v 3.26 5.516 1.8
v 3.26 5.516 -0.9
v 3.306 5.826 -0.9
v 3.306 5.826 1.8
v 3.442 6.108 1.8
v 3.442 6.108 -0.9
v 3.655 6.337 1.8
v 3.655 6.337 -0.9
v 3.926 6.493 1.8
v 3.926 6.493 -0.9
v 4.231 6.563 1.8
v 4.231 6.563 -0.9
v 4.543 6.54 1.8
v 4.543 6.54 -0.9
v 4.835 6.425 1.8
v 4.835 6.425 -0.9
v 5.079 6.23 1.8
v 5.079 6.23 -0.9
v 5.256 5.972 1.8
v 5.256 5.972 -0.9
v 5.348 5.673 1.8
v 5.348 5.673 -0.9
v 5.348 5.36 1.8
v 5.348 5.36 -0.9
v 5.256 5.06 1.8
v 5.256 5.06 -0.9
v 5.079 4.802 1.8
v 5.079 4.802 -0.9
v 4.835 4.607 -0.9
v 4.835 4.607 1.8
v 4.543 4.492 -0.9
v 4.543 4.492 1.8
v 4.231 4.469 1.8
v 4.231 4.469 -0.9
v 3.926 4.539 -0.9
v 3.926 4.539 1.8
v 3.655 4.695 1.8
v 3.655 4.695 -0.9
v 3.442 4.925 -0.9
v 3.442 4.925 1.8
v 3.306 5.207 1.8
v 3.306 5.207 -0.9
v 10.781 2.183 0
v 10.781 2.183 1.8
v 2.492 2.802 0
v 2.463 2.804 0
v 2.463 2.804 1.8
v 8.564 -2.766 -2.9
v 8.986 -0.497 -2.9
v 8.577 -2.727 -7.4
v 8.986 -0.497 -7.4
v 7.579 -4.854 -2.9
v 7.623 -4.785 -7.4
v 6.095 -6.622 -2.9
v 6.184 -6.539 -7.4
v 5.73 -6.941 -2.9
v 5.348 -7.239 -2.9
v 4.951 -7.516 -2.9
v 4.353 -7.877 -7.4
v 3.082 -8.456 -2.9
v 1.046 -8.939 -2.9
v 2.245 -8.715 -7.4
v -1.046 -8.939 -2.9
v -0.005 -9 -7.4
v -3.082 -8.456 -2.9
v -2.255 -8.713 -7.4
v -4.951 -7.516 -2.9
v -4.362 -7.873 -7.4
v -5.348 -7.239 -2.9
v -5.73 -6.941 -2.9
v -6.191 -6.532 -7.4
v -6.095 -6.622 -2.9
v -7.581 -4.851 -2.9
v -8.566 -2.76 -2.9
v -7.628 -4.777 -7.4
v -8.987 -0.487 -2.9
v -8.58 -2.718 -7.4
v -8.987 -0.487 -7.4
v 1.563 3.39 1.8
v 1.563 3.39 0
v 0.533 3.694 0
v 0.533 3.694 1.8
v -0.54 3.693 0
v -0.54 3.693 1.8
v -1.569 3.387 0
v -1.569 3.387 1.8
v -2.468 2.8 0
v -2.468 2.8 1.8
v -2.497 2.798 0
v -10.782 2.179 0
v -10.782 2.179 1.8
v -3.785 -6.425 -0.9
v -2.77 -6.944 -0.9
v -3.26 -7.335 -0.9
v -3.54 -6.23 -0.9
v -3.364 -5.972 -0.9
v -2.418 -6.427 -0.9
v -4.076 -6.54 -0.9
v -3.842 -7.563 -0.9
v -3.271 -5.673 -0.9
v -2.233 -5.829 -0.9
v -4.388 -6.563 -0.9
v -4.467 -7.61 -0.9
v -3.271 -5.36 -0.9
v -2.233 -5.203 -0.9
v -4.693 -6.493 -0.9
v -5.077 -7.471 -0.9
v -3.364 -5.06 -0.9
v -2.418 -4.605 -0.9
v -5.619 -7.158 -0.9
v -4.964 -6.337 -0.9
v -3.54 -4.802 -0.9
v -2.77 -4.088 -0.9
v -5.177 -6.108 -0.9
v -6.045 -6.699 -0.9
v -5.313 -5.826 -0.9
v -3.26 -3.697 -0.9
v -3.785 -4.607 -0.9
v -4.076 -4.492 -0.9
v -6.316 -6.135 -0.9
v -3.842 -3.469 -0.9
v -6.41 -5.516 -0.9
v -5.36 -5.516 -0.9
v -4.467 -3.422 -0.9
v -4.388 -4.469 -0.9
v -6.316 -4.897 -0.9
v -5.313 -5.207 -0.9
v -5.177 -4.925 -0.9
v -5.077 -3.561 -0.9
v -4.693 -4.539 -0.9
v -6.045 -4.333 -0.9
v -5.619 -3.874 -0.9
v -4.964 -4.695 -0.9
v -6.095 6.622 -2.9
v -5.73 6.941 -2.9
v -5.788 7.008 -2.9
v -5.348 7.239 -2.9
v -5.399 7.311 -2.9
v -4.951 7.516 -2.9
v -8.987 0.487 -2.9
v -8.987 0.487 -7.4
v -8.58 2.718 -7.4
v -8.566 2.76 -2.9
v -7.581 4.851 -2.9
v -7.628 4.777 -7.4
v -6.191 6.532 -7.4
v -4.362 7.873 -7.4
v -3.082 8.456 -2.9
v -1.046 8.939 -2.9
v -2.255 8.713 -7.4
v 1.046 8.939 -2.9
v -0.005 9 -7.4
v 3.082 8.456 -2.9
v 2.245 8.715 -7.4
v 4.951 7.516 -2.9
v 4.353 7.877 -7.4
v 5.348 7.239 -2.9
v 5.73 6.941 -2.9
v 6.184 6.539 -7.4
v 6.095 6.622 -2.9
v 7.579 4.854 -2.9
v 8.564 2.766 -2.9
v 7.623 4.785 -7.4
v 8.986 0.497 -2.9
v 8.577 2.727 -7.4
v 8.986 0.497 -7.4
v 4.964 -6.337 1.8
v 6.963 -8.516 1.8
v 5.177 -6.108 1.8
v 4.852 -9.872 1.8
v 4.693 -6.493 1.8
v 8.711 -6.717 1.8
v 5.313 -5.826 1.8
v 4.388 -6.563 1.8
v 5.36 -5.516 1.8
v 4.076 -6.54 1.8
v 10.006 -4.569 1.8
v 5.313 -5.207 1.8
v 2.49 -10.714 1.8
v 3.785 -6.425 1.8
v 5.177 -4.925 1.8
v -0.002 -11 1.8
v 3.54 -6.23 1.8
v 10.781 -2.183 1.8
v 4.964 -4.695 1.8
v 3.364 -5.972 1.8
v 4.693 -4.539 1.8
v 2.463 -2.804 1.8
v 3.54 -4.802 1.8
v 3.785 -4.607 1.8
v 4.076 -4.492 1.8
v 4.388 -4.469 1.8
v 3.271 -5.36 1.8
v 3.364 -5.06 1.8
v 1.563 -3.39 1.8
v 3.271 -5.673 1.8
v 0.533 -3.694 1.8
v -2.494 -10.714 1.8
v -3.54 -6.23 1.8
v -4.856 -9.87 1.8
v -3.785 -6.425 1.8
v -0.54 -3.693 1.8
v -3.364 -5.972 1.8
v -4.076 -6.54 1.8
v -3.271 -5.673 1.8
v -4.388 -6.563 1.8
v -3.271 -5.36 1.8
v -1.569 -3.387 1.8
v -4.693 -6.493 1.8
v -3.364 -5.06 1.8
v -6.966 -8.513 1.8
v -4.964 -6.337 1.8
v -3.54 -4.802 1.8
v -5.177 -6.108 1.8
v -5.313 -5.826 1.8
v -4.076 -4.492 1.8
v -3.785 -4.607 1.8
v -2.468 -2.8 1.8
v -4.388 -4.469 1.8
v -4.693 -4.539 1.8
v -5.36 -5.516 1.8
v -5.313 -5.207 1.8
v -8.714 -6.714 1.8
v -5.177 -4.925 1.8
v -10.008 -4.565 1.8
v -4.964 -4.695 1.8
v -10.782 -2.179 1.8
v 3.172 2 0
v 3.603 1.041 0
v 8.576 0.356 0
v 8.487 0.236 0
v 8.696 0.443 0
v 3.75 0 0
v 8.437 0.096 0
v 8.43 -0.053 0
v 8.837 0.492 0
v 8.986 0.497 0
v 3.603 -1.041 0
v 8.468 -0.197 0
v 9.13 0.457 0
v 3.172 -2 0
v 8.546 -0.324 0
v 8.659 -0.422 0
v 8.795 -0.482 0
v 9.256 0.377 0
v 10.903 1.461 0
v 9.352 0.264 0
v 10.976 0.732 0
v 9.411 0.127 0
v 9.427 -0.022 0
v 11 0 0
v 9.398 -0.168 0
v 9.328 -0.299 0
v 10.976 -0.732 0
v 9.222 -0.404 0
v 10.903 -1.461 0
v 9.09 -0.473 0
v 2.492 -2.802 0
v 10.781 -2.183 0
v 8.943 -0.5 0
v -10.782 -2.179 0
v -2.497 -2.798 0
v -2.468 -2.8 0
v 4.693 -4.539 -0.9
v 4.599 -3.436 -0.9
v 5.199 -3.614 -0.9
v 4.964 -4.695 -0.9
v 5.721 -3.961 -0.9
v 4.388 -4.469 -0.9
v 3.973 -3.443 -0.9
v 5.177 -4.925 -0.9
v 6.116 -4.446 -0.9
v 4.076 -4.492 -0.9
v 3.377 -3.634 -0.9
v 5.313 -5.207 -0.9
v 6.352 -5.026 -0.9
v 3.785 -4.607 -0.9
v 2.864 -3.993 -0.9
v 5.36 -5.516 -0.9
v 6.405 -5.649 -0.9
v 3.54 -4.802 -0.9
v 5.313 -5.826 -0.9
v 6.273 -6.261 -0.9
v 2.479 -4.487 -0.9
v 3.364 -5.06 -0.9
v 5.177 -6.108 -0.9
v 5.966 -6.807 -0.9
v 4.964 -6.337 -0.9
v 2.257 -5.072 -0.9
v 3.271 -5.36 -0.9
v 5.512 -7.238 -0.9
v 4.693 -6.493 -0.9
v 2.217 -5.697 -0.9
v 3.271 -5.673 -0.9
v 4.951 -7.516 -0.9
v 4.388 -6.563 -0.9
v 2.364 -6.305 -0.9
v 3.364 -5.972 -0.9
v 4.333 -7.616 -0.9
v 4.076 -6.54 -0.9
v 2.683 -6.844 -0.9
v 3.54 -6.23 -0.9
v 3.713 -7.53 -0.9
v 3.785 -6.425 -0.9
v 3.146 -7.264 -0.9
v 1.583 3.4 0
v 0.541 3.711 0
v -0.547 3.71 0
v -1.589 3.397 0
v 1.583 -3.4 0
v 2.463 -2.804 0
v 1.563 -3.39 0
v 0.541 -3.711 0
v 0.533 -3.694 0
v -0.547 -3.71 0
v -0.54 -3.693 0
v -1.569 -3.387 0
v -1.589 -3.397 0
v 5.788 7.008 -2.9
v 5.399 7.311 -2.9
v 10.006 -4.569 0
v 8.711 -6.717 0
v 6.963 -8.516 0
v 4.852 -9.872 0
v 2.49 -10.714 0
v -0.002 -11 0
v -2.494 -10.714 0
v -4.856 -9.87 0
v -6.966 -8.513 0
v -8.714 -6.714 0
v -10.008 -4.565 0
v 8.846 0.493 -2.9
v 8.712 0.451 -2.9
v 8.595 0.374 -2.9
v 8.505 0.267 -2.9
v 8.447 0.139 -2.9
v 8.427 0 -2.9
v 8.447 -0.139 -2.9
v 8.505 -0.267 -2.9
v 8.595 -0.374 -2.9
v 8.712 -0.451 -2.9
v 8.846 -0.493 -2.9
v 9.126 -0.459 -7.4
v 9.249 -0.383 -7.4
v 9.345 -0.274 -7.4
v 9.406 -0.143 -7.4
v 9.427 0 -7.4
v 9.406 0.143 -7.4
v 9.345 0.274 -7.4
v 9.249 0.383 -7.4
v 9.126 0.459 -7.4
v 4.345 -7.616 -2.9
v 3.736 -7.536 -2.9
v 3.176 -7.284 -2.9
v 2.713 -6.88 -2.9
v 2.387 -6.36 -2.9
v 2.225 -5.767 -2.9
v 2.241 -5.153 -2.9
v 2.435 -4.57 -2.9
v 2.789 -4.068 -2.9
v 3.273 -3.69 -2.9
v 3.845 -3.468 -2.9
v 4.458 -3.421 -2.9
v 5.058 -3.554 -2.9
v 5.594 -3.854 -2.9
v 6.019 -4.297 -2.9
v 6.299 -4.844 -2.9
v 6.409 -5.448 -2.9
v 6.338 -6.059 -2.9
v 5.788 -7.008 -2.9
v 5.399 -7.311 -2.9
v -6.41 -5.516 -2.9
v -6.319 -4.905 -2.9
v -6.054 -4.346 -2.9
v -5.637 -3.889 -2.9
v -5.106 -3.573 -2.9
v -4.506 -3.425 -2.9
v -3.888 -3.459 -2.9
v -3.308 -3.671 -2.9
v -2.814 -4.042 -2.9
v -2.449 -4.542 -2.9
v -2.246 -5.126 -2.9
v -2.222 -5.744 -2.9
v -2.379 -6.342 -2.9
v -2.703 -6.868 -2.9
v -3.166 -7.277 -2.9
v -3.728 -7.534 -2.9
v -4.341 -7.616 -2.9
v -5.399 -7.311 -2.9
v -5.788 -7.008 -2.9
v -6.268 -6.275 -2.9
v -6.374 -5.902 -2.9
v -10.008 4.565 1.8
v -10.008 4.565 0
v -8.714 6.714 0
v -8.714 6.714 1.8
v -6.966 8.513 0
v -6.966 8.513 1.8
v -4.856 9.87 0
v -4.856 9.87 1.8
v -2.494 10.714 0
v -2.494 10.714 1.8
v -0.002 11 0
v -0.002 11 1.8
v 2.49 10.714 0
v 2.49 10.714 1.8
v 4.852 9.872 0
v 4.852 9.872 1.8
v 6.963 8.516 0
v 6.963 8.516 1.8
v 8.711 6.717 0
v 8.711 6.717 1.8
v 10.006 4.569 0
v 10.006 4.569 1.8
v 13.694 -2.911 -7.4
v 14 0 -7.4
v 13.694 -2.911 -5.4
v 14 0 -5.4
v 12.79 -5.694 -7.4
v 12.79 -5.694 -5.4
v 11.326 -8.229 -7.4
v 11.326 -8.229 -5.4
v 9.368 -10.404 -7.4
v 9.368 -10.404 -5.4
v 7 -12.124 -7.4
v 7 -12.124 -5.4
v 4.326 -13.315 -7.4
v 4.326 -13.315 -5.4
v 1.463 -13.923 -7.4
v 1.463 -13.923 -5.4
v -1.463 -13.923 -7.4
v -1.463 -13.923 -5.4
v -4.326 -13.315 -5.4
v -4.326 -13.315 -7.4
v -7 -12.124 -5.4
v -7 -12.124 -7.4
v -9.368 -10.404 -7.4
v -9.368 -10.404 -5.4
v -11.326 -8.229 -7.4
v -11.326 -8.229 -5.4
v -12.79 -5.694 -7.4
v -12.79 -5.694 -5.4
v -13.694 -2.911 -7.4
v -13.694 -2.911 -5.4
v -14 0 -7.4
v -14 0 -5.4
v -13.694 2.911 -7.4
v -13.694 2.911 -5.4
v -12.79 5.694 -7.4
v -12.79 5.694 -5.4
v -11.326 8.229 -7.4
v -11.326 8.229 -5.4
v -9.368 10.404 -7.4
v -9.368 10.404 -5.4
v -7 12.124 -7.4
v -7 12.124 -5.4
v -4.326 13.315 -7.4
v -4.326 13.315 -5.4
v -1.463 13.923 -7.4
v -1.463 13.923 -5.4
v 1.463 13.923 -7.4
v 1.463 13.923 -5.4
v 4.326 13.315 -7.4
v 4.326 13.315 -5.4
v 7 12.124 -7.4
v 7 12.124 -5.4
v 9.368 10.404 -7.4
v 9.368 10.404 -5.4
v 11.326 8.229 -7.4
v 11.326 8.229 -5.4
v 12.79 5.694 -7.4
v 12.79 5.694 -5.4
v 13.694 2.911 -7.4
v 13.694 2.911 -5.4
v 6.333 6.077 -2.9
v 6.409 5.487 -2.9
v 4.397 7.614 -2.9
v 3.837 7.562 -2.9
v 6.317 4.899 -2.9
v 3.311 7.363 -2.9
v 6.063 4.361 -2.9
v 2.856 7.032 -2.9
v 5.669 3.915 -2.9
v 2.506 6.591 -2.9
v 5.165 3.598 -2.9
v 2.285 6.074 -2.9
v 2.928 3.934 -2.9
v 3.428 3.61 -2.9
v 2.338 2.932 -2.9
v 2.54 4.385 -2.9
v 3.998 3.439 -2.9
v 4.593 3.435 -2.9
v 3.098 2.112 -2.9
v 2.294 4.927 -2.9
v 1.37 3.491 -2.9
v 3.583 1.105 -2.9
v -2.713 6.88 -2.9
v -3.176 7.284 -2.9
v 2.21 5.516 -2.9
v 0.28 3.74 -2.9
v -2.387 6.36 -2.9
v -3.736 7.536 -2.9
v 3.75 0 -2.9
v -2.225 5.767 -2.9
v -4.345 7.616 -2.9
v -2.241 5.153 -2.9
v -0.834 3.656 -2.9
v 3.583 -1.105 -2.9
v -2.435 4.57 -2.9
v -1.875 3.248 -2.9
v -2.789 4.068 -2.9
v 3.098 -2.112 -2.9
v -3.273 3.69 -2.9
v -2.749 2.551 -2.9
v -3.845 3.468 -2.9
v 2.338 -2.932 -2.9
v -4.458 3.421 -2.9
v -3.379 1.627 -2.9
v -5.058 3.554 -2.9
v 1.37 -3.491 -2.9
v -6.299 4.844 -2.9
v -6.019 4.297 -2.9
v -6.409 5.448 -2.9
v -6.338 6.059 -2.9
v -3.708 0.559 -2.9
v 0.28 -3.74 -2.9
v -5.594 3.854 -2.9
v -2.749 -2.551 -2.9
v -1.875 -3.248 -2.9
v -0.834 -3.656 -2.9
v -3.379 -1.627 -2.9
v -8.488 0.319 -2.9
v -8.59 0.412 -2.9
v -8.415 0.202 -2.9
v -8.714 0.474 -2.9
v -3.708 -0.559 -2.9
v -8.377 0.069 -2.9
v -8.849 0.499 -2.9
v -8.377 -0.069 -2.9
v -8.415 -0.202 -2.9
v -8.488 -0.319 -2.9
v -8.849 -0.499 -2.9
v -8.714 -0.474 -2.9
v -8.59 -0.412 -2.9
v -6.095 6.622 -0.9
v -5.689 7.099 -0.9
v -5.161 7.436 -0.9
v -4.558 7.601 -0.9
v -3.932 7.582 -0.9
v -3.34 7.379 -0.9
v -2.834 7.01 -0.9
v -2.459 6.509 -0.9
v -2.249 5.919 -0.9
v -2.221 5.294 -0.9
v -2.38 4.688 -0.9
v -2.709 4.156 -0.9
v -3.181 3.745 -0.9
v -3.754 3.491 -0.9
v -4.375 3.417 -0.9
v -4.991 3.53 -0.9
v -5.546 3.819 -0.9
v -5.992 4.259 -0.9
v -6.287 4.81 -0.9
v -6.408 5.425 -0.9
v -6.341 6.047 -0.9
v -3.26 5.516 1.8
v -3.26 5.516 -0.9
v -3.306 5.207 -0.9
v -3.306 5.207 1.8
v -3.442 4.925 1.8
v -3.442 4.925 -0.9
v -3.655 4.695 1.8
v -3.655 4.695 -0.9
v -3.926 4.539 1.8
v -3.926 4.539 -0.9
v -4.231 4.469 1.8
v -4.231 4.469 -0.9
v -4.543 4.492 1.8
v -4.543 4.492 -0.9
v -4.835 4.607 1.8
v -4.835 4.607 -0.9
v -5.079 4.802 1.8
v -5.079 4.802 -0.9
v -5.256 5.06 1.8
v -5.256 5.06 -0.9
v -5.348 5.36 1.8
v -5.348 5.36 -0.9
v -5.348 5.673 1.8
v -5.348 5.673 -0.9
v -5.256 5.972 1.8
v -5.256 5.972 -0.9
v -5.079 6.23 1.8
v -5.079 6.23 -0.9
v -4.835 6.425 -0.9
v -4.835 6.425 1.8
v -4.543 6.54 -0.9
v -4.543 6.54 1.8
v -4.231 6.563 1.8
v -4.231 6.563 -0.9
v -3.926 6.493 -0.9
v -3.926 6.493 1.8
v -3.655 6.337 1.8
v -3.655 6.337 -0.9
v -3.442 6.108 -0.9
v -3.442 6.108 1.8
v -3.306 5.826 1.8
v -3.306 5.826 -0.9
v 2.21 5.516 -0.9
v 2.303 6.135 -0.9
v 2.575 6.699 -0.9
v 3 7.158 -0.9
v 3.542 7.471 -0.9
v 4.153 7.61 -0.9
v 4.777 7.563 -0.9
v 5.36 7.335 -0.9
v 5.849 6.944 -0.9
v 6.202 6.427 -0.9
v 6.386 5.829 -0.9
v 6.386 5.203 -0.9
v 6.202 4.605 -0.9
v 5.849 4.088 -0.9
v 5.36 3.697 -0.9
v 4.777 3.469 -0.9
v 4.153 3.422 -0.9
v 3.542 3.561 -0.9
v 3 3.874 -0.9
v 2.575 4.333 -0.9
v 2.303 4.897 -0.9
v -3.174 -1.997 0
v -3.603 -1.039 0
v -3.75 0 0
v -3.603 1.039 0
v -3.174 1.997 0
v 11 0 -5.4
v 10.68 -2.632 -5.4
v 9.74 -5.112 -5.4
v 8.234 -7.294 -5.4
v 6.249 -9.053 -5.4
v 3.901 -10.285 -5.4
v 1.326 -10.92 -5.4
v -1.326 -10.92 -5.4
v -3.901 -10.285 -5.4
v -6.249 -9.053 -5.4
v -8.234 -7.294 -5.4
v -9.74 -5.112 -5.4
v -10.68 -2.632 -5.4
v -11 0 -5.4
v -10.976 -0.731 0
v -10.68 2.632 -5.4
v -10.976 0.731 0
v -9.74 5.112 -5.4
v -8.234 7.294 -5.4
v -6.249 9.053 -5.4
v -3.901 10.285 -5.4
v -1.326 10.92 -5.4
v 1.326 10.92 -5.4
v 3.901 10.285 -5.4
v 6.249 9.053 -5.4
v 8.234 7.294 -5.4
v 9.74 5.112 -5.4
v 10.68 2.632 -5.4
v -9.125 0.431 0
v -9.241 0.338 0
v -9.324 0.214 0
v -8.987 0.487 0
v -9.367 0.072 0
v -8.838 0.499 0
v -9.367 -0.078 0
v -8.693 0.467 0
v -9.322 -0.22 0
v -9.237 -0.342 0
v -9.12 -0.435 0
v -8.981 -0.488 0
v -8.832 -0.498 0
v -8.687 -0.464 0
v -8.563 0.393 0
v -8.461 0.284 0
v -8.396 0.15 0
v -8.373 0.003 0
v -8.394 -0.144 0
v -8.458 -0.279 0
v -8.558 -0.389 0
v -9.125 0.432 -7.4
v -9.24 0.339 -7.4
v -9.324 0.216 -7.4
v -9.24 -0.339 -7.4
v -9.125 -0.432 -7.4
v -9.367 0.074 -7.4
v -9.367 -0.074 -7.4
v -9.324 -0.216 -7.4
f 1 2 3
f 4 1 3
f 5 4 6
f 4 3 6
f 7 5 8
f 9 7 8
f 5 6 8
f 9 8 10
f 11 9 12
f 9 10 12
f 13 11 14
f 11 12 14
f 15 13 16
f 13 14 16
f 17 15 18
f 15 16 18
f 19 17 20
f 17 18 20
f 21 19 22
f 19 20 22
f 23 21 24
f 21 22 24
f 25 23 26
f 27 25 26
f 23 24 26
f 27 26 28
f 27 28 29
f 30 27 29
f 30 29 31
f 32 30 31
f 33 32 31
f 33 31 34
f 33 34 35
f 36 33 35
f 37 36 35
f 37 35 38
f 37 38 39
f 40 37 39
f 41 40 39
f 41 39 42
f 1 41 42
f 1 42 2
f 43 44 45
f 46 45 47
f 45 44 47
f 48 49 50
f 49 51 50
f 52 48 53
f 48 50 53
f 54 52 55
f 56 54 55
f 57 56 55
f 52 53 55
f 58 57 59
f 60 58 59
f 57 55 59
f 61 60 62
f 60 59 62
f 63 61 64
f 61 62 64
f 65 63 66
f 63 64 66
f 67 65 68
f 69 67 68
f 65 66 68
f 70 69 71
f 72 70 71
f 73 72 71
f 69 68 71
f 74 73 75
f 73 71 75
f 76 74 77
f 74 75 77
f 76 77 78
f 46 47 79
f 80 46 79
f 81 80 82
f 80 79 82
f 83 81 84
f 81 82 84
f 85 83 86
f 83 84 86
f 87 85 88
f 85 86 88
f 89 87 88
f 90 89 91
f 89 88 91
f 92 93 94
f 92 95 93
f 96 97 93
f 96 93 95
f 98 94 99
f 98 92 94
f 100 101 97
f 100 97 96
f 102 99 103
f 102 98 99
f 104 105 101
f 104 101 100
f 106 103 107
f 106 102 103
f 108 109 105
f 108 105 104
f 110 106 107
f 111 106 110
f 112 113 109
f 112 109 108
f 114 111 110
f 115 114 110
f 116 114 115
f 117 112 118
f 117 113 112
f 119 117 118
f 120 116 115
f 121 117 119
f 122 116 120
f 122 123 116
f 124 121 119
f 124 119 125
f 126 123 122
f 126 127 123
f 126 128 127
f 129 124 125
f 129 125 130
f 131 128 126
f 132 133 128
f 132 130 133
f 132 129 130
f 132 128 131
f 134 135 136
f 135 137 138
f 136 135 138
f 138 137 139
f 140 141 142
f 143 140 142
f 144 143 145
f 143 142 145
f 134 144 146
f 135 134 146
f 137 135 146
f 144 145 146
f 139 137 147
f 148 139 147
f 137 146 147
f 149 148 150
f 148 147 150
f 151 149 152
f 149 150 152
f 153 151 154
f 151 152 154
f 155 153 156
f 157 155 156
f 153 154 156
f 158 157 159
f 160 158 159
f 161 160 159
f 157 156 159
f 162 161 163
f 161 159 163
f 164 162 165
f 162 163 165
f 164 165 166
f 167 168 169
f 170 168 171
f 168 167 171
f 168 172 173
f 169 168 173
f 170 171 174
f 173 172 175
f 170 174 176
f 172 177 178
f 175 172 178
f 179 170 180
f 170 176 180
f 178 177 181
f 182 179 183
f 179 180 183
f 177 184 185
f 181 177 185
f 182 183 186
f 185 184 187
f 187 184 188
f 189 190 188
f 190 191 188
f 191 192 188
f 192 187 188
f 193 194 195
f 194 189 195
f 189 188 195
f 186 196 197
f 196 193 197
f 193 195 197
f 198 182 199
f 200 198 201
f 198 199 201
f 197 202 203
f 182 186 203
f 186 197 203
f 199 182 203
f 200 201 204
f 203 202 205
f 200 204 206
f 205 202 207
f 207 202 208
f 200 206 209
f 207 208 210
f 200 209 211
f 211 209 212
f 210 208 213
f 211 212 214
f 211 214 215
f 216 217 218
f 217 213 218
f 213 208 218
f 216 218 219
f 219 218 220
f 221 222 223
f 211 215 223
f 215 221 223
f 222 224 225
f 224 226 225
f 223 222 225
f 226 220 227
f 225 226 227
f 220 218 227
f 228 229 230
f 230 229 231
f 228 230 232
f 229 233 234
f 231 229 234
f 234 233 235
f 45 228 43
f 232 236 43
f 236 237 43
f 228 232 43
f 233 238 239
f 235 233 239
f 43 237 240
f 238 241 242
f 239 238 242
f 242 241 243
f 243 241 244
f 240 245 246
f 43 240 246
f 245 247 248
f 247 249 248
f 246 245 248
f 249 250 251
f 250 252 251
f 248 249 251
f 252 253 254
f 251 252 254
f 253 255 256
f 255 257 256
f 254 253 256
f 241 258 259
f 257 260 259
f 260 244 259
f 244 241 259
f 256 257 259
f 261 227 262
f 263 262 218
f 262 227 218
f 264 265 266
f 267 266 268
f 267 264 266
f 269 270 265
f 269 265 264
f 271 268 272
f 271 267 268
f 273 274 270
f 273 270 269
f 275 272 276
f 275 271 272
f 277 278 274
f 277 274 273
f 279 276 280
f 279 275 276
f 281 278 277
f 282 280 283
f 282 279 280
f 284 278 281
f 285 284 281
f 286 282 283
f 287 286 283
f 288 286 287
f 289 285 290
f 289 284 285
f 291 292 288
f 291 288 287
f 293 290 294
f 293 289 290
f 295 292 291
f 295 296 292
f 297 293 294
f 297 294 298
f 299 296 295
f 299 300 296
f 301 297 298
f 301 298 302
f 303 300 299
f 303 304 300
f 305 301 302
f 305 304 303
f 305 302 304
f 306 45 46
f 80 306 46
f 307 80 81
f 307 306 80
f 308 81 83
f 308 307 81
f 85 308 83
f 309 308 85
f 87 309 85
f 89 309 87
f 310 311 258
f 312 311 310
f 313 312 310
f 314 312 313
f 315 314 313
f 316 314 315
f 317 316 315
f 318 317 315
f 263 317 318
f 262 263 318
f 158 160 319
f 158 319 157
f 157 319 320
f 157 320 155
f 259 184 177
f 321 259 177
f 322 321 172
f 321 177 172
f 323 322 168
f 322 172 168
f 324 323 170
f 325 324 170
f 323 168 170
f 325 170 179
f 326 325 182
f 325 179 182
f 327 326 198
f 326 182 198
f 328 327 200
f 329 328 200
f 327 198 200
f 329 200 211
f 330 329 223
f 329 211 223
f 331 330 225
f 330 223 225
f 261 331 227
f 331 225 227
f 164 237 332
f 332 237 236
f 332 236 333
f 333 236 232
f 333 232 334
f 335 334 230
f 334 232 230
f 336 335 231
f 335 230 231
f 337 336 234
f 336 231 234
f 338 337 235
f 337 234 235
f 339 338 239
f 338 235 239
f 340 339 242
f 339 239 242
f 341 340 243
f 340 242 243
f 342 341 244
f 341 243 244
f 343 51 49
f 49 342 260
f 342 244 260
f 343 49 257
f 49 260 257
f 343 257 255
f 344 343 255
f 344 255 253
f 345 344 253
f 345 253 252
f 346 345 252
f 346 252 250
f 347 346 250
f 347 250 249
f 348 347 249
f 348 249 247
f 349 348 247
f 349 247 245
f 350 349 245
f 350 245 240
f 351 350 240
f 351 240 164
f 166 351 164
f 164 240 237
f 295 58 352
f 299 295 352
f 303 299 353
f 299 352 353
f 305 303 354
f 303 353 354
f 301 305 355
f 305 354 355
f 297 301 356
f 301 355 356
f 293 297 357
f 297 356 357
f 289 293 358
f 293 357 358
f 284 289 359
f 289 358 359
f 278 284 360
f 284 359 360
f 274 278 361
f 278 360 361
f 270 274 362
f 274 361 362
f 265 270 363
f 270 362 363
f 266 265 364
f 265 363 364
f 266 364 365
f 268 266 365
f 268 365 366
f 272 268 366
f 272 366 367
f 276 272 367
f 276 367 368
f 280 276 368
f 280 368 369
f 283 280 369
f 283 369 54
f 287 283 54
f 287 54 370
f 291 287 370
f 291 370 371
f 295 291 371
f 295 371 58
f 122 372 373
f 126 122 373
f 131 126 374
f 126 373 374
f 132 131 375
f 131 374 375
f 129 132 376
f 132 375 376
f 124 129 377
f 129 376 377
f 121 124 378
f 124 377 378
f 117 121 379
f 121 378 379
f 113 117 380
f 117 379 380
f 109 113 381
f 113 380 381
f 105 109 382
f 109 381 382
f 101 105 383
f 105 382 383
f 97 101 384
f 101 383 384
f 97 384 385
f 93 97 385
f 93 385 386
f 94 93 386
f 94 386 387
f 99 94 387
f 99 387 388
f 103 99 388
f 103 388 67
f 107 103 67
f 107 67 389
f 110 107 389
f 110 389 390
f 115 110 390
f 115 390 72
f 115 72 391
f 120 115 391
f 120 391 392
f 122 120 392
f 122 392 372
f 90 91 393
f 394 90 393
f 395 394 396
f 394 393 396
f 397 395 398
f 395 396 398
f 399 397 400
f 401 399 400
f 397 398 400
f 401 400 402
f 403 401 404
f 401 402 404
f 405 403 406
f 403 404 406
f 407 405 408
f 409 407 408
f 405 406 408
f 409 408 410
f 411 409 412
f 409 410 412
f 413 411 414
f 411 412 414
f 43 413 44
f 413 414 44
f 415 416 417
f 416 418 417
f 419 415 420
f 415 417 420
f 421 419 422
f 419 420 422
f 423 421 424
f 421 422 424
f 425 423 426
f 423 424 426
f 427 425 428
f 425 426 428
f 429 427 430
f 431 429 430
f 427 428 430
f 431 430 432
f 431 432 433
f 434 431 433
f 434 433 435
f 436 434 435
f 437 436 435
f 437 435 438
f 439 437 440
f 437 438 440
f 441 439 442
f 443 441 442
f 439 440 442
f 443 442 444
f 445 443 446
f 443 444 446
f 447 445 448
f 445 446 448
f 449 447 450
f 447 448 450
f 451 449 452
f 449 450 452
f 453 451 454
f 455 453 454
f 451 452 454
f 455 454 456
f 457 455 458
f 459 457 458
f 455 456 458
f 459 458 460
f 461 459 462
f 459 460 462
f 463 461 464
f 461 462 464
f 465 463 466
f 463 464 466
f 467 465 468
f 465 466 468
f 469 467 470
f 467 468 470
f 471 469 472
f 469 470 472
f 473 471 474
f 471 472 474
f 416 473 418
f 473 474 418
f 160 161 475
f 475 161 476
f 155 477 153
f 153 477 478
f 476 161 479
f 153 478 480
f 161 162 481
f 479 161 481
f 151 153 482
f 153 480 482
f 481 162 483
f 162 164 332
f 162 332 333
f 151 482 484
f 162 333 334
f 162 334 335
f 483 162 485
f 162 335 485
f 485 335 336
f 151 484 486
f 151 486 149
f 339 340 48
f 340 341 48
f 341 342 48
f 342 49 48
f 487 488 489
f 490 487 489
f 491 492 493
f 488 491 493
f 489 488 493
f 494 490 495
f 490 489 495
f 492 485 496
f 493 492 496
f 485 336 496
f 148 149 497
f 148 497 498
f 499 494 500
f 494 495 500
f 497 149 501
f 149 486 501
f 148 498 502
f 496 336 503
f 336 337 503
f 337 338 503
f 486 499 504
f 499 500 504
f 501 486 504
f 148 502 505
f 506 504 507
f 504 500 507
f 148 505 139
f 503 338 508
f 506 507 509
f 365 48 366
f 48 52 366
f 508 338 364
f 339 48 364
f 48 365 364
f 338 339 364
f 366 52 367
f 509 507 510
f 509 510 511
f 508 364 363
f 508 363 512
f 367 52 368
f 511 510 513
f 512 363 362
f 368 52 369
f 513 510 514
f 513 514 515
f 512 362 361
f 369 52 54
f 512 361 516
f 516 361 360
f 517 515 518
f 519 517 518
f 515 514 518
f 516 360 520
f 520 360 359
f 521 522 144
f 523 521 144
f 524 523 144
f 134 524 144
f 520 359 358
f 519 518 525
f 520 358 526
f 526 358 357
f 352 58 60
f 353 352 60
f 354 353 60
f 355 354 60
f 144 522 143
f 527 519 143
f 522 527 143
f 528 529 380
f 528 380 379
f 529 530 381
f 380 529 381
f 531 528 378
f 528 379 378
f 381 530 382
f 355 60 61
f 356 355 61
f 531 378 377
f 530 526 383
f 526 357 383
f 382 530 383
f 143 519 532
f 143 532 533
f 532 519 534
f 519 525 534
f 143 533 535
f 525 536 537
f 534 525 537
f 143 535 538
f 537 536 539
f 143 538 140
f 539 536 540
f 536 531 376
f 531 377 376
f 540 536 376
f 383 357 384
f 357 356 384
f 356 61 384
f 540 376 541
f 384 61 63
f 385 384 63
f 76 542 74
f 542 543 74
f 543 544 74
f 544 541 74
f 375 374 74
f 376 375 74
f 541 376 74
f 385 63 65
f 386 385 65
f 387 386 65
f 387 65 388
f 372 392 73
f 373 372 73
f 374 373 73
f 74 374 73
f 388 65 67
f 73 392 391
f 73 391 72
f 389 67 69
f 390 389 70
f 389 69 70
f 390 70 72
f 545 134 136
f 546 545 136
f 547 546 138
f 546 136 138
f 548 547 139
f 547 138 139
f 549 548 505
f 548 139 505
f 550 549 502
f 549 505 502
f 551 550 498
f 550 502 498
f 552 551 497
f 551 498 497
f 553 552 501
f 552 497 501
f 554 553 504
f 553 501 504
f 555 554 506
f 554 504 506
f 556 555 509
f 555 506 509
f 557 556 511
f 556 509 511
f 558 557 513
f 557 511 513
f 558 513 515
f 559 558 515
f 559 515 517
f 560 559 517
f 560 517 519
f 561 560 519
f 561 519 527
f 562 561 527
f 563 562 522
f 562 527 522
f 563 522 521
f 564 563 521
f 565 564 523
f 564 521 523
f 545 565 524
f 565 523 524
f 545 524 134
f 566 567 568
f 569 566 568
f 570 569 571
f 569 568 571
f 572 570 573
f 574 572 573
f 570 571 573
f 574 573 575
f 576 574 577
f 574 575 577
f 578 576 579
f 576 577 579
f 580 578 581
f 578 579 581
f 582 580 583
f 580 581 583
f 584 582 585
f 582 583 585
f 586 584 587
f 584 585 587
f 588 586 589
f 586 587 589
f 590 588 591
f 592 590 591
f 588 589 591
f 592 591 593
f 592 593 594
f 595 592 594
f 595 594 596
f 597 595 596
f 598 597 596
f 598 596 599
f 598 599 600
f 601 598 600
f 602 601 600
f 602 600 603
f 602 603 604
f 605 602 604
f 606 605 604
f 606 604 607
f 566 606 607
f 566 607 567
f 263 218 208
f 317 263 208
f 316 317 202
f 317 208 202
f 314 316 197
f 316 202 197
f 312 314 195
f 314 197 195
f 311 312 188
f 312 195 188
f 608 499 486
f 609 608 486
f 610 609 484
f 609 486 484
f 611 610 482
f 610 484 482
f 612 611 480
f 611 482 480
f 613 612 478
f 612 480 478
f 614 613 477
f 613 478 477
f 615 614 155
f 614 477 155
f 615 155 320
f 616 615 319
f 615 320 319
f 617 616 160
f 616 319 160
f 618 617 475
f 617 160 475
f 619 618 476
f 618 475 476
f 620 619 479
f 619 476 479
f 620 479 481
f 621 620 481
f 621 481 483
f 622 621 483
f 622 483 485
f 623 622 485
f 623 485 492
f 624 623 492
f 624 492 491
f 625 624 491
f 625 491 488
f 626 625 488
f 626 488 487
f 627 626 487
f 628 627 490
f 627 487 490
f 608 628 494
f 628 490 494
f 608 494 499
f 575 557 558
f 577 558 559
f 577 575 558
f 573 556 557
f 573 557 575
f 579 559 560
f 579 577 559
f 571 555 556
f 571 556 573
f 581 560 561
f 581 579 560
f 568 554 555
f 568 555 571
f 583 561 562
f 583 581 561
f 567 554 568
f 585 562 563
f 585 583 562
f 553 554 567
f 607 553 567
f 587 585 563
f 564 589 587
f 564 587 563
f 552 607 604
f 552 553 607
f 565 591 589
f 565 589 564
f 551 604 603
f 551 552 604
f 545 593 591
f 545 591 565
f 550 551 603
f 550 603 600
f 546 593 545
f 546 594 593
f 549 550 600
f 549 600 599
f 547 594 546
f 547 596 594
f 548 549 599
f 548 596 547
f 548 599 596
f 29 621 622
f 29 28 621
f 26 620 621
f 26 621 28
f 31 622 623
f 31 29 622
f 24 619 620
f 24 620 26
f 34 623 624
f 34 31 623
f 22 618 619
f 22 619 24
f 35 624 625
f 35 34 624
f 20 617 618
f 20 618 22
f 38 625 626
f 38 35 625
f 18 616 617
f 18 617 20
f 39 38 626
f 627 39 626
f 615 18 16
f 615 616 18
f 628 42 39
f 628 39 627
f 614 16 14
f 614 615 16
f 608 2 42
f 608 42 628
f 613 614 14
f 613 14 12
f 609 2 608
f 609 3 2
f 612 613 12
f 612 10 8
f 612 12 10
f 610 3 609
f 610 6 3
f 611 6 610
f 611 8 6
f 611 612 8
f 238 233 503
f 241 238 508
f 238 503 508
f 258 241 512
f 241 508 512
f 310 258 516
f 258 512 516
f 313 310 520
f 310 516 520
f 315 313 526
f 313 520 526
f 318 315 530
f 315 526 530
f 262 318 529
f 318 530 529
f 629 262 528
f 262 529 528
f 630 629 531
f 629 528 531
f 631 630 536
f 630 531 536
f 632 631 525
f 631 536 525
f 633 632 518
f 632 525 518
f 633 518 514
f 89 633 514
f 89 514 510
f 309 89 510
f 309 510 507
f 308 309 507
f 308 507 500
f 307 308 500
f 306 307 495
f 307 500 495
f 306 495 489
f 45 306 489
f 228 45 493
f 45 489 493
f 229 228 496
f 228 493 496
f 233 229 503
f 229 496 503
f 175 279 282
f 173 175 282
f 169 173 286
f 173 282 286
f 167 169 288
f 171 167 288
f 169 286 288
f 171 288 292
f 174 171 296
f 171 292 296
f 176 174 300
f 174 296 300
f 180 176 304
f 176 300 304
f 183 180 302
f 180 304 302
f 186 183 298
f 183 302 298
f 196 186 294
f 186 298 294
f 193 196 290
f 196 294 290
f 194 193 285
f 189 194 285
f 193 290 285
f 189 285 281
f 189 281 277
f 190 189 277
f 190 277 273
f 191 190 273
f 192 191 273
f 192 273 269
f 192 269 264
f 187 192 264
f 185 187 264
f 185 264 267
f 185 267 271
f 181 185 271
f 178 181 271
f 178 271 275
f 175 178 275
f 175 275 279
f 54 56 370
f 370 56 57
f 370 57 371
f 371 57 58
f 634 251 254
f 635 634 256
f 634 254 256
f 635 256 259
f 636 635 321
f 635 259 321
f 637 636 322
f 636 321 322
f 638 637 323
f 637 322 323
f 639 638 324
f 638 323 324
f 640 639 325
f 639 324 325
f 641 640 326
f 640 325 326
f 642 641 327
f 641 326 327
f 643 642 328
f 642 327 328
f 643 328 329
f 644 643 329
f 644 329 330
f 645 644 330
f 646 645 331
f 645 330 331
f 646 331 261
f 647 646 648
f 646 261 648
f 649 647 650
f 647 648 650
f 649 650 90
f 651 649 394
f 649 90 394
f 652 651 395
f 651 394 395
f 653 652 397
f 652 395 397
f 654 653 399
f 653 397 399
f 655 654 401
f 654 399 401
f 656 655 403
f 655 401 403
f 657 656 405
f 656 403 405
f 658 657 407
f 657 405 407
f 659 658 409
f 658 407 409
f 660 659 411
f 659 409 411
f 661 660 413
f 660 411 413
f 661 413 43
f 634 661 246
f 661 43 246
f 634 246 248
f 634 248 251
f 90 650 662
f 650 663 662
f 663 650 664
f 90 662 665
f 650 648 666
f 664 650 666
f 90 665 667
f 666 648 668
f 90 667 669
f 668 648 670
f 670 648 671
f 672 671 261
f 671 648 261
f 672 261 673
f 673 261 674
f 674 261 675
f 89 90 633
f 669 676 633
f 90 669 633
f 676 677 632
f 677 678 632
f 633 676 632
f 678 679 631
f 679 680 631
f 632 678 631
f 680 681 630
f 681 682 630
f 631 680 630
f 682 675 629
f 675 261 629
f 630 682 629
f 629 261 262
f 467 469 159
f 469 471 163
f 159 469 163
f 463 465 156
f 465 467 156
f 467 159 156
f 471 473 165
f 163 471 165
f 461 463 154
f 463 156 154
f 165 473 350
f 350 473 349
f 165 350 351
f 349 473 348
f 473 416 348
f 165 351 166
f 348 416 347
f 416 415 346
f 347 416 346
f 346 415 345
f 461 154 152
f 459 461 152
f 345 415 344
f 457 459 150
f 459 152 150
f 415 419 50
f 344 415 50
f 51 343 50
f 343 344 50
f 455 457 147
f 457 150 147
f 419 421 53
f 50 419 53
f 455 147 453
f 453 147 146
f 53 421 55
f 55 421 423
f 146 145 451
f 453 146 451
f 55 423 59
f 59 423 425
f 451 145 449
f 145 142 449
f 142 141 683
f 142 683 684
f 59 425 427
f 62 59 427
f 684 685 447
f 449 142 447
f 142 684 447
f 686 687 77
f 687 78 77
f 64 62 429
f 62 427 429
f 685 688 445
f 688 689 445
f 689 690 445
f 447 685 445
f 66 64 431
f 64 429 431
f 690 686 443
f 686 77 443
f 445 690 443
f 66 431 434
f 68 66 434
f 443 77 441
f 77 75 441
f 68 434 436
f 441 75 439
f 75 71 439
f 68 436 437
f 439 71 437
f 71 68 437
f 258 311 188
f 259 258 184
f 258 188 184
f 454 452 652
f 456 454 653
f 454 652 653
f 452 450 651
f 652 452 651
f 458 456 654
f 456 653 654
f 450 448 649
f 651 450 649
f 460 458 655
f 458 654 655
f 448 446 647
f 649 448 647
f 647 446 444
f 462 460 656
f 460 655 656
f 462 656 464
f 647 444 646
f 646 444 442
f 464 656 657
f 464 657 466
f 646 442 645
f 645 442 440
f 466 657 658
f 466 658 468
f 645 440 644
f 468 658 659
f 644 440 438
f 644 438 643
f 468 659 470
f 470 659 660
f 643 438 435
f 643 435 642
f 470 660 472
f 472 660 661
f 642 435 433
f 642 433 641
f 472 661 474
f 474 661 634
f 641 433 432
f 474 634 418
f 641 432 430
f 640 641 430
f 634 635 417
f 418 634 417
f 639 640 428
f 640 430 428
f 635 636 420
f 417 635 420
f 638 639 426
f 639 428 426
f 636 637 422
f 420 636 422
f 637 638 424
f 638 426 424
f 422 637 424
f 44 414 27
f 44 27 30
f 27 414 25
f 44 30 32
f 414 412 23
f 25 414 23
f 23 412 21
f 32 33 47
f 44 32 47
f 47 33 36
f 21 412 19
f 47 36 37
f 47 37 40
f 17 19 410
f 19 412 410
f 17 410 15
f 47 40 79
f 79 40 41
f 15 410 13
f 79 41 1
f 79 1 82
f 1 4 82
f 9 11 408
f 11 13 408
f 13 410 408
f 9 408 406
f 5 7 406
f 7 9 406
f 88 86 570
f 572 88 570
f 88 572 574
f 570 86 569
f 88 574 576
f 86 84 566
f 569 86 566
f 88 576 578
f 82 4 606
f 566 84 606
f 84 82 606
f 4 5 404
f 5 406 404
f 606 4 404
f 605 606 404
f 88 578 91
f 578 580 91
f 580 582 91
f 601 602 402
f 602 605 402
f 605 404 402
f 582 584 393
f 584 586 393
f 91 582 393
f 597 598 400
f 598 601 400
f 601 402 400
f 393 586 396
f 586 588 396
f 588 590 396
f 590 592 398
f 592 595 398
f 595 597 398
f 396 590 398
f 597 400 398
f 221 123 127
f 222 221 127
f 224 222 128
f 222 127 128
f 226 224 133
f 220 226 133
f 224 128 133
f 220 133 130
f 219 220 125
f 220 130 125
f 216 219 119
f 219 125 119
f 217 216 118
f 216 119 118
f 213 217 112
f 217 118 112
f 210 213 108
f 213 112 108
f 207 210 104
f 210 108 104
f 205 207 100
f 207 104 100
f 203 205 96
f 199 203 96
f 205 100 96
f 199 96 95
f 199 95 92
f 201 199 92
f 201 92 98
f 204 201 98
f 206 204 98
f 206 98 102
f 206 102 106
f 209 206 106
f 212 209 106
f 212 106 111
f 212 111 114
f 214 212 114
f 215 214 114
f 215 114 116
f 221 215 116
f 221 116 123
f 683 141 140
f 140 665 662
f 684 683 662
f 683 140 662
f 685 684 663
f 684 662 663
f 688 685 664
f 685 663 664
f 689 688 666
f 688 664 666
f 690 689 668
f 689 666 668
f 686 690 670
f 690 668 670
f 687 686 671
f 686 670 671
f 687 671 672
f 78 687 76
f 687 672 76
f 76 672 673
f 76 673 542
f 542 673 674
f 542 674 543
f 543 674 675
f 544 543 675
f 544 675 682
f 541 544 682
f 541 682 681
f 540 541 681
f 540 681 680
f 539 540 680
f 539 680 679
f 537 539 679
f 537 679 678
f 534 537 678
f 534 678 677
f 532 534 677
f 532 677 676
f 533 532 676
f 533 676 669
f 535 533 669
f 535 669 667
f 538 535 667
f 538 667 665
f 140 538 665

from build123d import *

# Parameters (mm, degrees)
BOSS_EXTRU_1_START      = 1.8
ESQUISSE2_R             = 0.5
BOSS_EXTRU_1_DEPTH      = 1.8
ESQUISSE4_R             = 0.5
ENL_V_MAT_EXTRU_3_DEPTH = 22.832086478
ESQUISSE6_R             = 2.1
ENL_V_MAT_EXTRU_4_DEPTH = 2
ESQUISSE7_R             = 1.05
ENL_V_MAT_EXTRU_5_DEPTH = 21.349201459


with BuildPart() as part:
    # Esquisse1 → Révolution1 (revolve)
    with BuildSketch(Plane(origin=(0, 0, 0), x_dir=(1, 0, 0), z_dir=(0, 1, 0))):
        Polygon((-11, 0), (-3.75, 0), (-3.75, 2.9), (-9, 2.9), (-9, 7.4), (-14, 7.4), (-14, 5.4), (-11, 5.4), align=None)
    revolve(axis=Axis((0, 0, 0), (0, 0, -1)))

    # Esquisse2 → Boss.-Extru.1 (add)
    with BuildSketch(Plane.XY.offset(BOSS_EXTRU_1_START)):
        with Locations((-8.872610569, 0)):
            Circle(ESQUISSE2_R)
        with Locations((8.927389431, 0)):
            Circle(ESQUISSE2_R)
        with BuildLine():
            Line((-2.468322158, 2.8), (-10.781965021, 2.179272878))
            ThreePointArc((-10.781965021, 2.179272878), (-0.002117582, 10.999999796), (10.78112517, 2.183423933))
            Line((10.78112517, 2.183423933), (2.463250179, 2.804463021))
            ThreePointArc((2.463250179, 2.804463021), (-0.003378, 3.732640201), (-2.468322158, 2.8))
        make_face()
        with BuildLine():
            Line((-10.781965021, -2.179272878), (-2.468322158, -2.8))
            ThreePointArc((-2.468322158, -2.8), (-0.003378, -3.732640201), (2.463250179, -2.804463021))
            Line((2.463250179, -2.804463021), (10.78112517, -2.183423933))
            ThreePointArc((10.78112517, -2.183423933), (-0.002117582, -10.999999796), (-10.781965021, -2.179272878))
        make_face()
    extrude(amount=-BOSS_EXTRU_1_DEPTH)

    # Esquisse4 → Enlèv. mat.-Extru.3 (cut, through all)
    with BuildSketch(Plane.XY.offset(1.8)):
        with Locations((-8.872610569, 0)):
            Circle(ESQUISSE4_R)
        with Locations((8.927389431, 0)):
            Circle(ESQUISSE4_R)
    extrude(amount=-ENL_V_MAT_EXTRU_3_DEPTH, mode=Mode.SUBTRACT)

    # Esquisse6 → Enlèv. mat.-Extru.4 (cut)
    with BuildSketch(Plane(origin=(0, 0, -2.9), x_dir=(-1, 0, 0), z_dir=(0, 0, -1))):
        with Locations((-4.309630327, 5.516075275)):
            Circle(ESQUISSE6_R)
        with Locations((4.309630327, 5.516075275)):
            Circle(ESQUISSE6_R)
        with Locations((-4.309630327, -5.516075275)):
            Circle(ESQUISSE6_R)
        with Locations((4.309630327, -5.516075275)):
            Circle(ESQUISSE6_R)
    extrude(amount=-ENL_V_MAT_EXTRU_4_DEPTH, mode=Mode.SUBTRACT)

    # Esquisse7 → Enlèv. mat.-Extru.5 (cut, through all)
    with BuildSketch(Plane(origin=(0, 0, -2.9), x_dir=(-1, 0, 0), z_dir=(0, 0, -1))):
        with Locations((4.309630327, -5.516075275)):
            Circle(ESQUISSE7_R)
        with Locations((-4.309630327, -5.516075275)):
            Circle(ESQUISSE7_R)
        with Locations((4.309630327, 5.516075275)):
            Circle(ESQUISSE7_R)
        with Locations((-4.309630327, 5.516075275)):
            Circle(ESQUISSE7_R)
    extrude(amount=-ENL_V_MAT_EXTRU_5_DEPTH, mode=Mode.SUBTRACT)


solid = part.part
